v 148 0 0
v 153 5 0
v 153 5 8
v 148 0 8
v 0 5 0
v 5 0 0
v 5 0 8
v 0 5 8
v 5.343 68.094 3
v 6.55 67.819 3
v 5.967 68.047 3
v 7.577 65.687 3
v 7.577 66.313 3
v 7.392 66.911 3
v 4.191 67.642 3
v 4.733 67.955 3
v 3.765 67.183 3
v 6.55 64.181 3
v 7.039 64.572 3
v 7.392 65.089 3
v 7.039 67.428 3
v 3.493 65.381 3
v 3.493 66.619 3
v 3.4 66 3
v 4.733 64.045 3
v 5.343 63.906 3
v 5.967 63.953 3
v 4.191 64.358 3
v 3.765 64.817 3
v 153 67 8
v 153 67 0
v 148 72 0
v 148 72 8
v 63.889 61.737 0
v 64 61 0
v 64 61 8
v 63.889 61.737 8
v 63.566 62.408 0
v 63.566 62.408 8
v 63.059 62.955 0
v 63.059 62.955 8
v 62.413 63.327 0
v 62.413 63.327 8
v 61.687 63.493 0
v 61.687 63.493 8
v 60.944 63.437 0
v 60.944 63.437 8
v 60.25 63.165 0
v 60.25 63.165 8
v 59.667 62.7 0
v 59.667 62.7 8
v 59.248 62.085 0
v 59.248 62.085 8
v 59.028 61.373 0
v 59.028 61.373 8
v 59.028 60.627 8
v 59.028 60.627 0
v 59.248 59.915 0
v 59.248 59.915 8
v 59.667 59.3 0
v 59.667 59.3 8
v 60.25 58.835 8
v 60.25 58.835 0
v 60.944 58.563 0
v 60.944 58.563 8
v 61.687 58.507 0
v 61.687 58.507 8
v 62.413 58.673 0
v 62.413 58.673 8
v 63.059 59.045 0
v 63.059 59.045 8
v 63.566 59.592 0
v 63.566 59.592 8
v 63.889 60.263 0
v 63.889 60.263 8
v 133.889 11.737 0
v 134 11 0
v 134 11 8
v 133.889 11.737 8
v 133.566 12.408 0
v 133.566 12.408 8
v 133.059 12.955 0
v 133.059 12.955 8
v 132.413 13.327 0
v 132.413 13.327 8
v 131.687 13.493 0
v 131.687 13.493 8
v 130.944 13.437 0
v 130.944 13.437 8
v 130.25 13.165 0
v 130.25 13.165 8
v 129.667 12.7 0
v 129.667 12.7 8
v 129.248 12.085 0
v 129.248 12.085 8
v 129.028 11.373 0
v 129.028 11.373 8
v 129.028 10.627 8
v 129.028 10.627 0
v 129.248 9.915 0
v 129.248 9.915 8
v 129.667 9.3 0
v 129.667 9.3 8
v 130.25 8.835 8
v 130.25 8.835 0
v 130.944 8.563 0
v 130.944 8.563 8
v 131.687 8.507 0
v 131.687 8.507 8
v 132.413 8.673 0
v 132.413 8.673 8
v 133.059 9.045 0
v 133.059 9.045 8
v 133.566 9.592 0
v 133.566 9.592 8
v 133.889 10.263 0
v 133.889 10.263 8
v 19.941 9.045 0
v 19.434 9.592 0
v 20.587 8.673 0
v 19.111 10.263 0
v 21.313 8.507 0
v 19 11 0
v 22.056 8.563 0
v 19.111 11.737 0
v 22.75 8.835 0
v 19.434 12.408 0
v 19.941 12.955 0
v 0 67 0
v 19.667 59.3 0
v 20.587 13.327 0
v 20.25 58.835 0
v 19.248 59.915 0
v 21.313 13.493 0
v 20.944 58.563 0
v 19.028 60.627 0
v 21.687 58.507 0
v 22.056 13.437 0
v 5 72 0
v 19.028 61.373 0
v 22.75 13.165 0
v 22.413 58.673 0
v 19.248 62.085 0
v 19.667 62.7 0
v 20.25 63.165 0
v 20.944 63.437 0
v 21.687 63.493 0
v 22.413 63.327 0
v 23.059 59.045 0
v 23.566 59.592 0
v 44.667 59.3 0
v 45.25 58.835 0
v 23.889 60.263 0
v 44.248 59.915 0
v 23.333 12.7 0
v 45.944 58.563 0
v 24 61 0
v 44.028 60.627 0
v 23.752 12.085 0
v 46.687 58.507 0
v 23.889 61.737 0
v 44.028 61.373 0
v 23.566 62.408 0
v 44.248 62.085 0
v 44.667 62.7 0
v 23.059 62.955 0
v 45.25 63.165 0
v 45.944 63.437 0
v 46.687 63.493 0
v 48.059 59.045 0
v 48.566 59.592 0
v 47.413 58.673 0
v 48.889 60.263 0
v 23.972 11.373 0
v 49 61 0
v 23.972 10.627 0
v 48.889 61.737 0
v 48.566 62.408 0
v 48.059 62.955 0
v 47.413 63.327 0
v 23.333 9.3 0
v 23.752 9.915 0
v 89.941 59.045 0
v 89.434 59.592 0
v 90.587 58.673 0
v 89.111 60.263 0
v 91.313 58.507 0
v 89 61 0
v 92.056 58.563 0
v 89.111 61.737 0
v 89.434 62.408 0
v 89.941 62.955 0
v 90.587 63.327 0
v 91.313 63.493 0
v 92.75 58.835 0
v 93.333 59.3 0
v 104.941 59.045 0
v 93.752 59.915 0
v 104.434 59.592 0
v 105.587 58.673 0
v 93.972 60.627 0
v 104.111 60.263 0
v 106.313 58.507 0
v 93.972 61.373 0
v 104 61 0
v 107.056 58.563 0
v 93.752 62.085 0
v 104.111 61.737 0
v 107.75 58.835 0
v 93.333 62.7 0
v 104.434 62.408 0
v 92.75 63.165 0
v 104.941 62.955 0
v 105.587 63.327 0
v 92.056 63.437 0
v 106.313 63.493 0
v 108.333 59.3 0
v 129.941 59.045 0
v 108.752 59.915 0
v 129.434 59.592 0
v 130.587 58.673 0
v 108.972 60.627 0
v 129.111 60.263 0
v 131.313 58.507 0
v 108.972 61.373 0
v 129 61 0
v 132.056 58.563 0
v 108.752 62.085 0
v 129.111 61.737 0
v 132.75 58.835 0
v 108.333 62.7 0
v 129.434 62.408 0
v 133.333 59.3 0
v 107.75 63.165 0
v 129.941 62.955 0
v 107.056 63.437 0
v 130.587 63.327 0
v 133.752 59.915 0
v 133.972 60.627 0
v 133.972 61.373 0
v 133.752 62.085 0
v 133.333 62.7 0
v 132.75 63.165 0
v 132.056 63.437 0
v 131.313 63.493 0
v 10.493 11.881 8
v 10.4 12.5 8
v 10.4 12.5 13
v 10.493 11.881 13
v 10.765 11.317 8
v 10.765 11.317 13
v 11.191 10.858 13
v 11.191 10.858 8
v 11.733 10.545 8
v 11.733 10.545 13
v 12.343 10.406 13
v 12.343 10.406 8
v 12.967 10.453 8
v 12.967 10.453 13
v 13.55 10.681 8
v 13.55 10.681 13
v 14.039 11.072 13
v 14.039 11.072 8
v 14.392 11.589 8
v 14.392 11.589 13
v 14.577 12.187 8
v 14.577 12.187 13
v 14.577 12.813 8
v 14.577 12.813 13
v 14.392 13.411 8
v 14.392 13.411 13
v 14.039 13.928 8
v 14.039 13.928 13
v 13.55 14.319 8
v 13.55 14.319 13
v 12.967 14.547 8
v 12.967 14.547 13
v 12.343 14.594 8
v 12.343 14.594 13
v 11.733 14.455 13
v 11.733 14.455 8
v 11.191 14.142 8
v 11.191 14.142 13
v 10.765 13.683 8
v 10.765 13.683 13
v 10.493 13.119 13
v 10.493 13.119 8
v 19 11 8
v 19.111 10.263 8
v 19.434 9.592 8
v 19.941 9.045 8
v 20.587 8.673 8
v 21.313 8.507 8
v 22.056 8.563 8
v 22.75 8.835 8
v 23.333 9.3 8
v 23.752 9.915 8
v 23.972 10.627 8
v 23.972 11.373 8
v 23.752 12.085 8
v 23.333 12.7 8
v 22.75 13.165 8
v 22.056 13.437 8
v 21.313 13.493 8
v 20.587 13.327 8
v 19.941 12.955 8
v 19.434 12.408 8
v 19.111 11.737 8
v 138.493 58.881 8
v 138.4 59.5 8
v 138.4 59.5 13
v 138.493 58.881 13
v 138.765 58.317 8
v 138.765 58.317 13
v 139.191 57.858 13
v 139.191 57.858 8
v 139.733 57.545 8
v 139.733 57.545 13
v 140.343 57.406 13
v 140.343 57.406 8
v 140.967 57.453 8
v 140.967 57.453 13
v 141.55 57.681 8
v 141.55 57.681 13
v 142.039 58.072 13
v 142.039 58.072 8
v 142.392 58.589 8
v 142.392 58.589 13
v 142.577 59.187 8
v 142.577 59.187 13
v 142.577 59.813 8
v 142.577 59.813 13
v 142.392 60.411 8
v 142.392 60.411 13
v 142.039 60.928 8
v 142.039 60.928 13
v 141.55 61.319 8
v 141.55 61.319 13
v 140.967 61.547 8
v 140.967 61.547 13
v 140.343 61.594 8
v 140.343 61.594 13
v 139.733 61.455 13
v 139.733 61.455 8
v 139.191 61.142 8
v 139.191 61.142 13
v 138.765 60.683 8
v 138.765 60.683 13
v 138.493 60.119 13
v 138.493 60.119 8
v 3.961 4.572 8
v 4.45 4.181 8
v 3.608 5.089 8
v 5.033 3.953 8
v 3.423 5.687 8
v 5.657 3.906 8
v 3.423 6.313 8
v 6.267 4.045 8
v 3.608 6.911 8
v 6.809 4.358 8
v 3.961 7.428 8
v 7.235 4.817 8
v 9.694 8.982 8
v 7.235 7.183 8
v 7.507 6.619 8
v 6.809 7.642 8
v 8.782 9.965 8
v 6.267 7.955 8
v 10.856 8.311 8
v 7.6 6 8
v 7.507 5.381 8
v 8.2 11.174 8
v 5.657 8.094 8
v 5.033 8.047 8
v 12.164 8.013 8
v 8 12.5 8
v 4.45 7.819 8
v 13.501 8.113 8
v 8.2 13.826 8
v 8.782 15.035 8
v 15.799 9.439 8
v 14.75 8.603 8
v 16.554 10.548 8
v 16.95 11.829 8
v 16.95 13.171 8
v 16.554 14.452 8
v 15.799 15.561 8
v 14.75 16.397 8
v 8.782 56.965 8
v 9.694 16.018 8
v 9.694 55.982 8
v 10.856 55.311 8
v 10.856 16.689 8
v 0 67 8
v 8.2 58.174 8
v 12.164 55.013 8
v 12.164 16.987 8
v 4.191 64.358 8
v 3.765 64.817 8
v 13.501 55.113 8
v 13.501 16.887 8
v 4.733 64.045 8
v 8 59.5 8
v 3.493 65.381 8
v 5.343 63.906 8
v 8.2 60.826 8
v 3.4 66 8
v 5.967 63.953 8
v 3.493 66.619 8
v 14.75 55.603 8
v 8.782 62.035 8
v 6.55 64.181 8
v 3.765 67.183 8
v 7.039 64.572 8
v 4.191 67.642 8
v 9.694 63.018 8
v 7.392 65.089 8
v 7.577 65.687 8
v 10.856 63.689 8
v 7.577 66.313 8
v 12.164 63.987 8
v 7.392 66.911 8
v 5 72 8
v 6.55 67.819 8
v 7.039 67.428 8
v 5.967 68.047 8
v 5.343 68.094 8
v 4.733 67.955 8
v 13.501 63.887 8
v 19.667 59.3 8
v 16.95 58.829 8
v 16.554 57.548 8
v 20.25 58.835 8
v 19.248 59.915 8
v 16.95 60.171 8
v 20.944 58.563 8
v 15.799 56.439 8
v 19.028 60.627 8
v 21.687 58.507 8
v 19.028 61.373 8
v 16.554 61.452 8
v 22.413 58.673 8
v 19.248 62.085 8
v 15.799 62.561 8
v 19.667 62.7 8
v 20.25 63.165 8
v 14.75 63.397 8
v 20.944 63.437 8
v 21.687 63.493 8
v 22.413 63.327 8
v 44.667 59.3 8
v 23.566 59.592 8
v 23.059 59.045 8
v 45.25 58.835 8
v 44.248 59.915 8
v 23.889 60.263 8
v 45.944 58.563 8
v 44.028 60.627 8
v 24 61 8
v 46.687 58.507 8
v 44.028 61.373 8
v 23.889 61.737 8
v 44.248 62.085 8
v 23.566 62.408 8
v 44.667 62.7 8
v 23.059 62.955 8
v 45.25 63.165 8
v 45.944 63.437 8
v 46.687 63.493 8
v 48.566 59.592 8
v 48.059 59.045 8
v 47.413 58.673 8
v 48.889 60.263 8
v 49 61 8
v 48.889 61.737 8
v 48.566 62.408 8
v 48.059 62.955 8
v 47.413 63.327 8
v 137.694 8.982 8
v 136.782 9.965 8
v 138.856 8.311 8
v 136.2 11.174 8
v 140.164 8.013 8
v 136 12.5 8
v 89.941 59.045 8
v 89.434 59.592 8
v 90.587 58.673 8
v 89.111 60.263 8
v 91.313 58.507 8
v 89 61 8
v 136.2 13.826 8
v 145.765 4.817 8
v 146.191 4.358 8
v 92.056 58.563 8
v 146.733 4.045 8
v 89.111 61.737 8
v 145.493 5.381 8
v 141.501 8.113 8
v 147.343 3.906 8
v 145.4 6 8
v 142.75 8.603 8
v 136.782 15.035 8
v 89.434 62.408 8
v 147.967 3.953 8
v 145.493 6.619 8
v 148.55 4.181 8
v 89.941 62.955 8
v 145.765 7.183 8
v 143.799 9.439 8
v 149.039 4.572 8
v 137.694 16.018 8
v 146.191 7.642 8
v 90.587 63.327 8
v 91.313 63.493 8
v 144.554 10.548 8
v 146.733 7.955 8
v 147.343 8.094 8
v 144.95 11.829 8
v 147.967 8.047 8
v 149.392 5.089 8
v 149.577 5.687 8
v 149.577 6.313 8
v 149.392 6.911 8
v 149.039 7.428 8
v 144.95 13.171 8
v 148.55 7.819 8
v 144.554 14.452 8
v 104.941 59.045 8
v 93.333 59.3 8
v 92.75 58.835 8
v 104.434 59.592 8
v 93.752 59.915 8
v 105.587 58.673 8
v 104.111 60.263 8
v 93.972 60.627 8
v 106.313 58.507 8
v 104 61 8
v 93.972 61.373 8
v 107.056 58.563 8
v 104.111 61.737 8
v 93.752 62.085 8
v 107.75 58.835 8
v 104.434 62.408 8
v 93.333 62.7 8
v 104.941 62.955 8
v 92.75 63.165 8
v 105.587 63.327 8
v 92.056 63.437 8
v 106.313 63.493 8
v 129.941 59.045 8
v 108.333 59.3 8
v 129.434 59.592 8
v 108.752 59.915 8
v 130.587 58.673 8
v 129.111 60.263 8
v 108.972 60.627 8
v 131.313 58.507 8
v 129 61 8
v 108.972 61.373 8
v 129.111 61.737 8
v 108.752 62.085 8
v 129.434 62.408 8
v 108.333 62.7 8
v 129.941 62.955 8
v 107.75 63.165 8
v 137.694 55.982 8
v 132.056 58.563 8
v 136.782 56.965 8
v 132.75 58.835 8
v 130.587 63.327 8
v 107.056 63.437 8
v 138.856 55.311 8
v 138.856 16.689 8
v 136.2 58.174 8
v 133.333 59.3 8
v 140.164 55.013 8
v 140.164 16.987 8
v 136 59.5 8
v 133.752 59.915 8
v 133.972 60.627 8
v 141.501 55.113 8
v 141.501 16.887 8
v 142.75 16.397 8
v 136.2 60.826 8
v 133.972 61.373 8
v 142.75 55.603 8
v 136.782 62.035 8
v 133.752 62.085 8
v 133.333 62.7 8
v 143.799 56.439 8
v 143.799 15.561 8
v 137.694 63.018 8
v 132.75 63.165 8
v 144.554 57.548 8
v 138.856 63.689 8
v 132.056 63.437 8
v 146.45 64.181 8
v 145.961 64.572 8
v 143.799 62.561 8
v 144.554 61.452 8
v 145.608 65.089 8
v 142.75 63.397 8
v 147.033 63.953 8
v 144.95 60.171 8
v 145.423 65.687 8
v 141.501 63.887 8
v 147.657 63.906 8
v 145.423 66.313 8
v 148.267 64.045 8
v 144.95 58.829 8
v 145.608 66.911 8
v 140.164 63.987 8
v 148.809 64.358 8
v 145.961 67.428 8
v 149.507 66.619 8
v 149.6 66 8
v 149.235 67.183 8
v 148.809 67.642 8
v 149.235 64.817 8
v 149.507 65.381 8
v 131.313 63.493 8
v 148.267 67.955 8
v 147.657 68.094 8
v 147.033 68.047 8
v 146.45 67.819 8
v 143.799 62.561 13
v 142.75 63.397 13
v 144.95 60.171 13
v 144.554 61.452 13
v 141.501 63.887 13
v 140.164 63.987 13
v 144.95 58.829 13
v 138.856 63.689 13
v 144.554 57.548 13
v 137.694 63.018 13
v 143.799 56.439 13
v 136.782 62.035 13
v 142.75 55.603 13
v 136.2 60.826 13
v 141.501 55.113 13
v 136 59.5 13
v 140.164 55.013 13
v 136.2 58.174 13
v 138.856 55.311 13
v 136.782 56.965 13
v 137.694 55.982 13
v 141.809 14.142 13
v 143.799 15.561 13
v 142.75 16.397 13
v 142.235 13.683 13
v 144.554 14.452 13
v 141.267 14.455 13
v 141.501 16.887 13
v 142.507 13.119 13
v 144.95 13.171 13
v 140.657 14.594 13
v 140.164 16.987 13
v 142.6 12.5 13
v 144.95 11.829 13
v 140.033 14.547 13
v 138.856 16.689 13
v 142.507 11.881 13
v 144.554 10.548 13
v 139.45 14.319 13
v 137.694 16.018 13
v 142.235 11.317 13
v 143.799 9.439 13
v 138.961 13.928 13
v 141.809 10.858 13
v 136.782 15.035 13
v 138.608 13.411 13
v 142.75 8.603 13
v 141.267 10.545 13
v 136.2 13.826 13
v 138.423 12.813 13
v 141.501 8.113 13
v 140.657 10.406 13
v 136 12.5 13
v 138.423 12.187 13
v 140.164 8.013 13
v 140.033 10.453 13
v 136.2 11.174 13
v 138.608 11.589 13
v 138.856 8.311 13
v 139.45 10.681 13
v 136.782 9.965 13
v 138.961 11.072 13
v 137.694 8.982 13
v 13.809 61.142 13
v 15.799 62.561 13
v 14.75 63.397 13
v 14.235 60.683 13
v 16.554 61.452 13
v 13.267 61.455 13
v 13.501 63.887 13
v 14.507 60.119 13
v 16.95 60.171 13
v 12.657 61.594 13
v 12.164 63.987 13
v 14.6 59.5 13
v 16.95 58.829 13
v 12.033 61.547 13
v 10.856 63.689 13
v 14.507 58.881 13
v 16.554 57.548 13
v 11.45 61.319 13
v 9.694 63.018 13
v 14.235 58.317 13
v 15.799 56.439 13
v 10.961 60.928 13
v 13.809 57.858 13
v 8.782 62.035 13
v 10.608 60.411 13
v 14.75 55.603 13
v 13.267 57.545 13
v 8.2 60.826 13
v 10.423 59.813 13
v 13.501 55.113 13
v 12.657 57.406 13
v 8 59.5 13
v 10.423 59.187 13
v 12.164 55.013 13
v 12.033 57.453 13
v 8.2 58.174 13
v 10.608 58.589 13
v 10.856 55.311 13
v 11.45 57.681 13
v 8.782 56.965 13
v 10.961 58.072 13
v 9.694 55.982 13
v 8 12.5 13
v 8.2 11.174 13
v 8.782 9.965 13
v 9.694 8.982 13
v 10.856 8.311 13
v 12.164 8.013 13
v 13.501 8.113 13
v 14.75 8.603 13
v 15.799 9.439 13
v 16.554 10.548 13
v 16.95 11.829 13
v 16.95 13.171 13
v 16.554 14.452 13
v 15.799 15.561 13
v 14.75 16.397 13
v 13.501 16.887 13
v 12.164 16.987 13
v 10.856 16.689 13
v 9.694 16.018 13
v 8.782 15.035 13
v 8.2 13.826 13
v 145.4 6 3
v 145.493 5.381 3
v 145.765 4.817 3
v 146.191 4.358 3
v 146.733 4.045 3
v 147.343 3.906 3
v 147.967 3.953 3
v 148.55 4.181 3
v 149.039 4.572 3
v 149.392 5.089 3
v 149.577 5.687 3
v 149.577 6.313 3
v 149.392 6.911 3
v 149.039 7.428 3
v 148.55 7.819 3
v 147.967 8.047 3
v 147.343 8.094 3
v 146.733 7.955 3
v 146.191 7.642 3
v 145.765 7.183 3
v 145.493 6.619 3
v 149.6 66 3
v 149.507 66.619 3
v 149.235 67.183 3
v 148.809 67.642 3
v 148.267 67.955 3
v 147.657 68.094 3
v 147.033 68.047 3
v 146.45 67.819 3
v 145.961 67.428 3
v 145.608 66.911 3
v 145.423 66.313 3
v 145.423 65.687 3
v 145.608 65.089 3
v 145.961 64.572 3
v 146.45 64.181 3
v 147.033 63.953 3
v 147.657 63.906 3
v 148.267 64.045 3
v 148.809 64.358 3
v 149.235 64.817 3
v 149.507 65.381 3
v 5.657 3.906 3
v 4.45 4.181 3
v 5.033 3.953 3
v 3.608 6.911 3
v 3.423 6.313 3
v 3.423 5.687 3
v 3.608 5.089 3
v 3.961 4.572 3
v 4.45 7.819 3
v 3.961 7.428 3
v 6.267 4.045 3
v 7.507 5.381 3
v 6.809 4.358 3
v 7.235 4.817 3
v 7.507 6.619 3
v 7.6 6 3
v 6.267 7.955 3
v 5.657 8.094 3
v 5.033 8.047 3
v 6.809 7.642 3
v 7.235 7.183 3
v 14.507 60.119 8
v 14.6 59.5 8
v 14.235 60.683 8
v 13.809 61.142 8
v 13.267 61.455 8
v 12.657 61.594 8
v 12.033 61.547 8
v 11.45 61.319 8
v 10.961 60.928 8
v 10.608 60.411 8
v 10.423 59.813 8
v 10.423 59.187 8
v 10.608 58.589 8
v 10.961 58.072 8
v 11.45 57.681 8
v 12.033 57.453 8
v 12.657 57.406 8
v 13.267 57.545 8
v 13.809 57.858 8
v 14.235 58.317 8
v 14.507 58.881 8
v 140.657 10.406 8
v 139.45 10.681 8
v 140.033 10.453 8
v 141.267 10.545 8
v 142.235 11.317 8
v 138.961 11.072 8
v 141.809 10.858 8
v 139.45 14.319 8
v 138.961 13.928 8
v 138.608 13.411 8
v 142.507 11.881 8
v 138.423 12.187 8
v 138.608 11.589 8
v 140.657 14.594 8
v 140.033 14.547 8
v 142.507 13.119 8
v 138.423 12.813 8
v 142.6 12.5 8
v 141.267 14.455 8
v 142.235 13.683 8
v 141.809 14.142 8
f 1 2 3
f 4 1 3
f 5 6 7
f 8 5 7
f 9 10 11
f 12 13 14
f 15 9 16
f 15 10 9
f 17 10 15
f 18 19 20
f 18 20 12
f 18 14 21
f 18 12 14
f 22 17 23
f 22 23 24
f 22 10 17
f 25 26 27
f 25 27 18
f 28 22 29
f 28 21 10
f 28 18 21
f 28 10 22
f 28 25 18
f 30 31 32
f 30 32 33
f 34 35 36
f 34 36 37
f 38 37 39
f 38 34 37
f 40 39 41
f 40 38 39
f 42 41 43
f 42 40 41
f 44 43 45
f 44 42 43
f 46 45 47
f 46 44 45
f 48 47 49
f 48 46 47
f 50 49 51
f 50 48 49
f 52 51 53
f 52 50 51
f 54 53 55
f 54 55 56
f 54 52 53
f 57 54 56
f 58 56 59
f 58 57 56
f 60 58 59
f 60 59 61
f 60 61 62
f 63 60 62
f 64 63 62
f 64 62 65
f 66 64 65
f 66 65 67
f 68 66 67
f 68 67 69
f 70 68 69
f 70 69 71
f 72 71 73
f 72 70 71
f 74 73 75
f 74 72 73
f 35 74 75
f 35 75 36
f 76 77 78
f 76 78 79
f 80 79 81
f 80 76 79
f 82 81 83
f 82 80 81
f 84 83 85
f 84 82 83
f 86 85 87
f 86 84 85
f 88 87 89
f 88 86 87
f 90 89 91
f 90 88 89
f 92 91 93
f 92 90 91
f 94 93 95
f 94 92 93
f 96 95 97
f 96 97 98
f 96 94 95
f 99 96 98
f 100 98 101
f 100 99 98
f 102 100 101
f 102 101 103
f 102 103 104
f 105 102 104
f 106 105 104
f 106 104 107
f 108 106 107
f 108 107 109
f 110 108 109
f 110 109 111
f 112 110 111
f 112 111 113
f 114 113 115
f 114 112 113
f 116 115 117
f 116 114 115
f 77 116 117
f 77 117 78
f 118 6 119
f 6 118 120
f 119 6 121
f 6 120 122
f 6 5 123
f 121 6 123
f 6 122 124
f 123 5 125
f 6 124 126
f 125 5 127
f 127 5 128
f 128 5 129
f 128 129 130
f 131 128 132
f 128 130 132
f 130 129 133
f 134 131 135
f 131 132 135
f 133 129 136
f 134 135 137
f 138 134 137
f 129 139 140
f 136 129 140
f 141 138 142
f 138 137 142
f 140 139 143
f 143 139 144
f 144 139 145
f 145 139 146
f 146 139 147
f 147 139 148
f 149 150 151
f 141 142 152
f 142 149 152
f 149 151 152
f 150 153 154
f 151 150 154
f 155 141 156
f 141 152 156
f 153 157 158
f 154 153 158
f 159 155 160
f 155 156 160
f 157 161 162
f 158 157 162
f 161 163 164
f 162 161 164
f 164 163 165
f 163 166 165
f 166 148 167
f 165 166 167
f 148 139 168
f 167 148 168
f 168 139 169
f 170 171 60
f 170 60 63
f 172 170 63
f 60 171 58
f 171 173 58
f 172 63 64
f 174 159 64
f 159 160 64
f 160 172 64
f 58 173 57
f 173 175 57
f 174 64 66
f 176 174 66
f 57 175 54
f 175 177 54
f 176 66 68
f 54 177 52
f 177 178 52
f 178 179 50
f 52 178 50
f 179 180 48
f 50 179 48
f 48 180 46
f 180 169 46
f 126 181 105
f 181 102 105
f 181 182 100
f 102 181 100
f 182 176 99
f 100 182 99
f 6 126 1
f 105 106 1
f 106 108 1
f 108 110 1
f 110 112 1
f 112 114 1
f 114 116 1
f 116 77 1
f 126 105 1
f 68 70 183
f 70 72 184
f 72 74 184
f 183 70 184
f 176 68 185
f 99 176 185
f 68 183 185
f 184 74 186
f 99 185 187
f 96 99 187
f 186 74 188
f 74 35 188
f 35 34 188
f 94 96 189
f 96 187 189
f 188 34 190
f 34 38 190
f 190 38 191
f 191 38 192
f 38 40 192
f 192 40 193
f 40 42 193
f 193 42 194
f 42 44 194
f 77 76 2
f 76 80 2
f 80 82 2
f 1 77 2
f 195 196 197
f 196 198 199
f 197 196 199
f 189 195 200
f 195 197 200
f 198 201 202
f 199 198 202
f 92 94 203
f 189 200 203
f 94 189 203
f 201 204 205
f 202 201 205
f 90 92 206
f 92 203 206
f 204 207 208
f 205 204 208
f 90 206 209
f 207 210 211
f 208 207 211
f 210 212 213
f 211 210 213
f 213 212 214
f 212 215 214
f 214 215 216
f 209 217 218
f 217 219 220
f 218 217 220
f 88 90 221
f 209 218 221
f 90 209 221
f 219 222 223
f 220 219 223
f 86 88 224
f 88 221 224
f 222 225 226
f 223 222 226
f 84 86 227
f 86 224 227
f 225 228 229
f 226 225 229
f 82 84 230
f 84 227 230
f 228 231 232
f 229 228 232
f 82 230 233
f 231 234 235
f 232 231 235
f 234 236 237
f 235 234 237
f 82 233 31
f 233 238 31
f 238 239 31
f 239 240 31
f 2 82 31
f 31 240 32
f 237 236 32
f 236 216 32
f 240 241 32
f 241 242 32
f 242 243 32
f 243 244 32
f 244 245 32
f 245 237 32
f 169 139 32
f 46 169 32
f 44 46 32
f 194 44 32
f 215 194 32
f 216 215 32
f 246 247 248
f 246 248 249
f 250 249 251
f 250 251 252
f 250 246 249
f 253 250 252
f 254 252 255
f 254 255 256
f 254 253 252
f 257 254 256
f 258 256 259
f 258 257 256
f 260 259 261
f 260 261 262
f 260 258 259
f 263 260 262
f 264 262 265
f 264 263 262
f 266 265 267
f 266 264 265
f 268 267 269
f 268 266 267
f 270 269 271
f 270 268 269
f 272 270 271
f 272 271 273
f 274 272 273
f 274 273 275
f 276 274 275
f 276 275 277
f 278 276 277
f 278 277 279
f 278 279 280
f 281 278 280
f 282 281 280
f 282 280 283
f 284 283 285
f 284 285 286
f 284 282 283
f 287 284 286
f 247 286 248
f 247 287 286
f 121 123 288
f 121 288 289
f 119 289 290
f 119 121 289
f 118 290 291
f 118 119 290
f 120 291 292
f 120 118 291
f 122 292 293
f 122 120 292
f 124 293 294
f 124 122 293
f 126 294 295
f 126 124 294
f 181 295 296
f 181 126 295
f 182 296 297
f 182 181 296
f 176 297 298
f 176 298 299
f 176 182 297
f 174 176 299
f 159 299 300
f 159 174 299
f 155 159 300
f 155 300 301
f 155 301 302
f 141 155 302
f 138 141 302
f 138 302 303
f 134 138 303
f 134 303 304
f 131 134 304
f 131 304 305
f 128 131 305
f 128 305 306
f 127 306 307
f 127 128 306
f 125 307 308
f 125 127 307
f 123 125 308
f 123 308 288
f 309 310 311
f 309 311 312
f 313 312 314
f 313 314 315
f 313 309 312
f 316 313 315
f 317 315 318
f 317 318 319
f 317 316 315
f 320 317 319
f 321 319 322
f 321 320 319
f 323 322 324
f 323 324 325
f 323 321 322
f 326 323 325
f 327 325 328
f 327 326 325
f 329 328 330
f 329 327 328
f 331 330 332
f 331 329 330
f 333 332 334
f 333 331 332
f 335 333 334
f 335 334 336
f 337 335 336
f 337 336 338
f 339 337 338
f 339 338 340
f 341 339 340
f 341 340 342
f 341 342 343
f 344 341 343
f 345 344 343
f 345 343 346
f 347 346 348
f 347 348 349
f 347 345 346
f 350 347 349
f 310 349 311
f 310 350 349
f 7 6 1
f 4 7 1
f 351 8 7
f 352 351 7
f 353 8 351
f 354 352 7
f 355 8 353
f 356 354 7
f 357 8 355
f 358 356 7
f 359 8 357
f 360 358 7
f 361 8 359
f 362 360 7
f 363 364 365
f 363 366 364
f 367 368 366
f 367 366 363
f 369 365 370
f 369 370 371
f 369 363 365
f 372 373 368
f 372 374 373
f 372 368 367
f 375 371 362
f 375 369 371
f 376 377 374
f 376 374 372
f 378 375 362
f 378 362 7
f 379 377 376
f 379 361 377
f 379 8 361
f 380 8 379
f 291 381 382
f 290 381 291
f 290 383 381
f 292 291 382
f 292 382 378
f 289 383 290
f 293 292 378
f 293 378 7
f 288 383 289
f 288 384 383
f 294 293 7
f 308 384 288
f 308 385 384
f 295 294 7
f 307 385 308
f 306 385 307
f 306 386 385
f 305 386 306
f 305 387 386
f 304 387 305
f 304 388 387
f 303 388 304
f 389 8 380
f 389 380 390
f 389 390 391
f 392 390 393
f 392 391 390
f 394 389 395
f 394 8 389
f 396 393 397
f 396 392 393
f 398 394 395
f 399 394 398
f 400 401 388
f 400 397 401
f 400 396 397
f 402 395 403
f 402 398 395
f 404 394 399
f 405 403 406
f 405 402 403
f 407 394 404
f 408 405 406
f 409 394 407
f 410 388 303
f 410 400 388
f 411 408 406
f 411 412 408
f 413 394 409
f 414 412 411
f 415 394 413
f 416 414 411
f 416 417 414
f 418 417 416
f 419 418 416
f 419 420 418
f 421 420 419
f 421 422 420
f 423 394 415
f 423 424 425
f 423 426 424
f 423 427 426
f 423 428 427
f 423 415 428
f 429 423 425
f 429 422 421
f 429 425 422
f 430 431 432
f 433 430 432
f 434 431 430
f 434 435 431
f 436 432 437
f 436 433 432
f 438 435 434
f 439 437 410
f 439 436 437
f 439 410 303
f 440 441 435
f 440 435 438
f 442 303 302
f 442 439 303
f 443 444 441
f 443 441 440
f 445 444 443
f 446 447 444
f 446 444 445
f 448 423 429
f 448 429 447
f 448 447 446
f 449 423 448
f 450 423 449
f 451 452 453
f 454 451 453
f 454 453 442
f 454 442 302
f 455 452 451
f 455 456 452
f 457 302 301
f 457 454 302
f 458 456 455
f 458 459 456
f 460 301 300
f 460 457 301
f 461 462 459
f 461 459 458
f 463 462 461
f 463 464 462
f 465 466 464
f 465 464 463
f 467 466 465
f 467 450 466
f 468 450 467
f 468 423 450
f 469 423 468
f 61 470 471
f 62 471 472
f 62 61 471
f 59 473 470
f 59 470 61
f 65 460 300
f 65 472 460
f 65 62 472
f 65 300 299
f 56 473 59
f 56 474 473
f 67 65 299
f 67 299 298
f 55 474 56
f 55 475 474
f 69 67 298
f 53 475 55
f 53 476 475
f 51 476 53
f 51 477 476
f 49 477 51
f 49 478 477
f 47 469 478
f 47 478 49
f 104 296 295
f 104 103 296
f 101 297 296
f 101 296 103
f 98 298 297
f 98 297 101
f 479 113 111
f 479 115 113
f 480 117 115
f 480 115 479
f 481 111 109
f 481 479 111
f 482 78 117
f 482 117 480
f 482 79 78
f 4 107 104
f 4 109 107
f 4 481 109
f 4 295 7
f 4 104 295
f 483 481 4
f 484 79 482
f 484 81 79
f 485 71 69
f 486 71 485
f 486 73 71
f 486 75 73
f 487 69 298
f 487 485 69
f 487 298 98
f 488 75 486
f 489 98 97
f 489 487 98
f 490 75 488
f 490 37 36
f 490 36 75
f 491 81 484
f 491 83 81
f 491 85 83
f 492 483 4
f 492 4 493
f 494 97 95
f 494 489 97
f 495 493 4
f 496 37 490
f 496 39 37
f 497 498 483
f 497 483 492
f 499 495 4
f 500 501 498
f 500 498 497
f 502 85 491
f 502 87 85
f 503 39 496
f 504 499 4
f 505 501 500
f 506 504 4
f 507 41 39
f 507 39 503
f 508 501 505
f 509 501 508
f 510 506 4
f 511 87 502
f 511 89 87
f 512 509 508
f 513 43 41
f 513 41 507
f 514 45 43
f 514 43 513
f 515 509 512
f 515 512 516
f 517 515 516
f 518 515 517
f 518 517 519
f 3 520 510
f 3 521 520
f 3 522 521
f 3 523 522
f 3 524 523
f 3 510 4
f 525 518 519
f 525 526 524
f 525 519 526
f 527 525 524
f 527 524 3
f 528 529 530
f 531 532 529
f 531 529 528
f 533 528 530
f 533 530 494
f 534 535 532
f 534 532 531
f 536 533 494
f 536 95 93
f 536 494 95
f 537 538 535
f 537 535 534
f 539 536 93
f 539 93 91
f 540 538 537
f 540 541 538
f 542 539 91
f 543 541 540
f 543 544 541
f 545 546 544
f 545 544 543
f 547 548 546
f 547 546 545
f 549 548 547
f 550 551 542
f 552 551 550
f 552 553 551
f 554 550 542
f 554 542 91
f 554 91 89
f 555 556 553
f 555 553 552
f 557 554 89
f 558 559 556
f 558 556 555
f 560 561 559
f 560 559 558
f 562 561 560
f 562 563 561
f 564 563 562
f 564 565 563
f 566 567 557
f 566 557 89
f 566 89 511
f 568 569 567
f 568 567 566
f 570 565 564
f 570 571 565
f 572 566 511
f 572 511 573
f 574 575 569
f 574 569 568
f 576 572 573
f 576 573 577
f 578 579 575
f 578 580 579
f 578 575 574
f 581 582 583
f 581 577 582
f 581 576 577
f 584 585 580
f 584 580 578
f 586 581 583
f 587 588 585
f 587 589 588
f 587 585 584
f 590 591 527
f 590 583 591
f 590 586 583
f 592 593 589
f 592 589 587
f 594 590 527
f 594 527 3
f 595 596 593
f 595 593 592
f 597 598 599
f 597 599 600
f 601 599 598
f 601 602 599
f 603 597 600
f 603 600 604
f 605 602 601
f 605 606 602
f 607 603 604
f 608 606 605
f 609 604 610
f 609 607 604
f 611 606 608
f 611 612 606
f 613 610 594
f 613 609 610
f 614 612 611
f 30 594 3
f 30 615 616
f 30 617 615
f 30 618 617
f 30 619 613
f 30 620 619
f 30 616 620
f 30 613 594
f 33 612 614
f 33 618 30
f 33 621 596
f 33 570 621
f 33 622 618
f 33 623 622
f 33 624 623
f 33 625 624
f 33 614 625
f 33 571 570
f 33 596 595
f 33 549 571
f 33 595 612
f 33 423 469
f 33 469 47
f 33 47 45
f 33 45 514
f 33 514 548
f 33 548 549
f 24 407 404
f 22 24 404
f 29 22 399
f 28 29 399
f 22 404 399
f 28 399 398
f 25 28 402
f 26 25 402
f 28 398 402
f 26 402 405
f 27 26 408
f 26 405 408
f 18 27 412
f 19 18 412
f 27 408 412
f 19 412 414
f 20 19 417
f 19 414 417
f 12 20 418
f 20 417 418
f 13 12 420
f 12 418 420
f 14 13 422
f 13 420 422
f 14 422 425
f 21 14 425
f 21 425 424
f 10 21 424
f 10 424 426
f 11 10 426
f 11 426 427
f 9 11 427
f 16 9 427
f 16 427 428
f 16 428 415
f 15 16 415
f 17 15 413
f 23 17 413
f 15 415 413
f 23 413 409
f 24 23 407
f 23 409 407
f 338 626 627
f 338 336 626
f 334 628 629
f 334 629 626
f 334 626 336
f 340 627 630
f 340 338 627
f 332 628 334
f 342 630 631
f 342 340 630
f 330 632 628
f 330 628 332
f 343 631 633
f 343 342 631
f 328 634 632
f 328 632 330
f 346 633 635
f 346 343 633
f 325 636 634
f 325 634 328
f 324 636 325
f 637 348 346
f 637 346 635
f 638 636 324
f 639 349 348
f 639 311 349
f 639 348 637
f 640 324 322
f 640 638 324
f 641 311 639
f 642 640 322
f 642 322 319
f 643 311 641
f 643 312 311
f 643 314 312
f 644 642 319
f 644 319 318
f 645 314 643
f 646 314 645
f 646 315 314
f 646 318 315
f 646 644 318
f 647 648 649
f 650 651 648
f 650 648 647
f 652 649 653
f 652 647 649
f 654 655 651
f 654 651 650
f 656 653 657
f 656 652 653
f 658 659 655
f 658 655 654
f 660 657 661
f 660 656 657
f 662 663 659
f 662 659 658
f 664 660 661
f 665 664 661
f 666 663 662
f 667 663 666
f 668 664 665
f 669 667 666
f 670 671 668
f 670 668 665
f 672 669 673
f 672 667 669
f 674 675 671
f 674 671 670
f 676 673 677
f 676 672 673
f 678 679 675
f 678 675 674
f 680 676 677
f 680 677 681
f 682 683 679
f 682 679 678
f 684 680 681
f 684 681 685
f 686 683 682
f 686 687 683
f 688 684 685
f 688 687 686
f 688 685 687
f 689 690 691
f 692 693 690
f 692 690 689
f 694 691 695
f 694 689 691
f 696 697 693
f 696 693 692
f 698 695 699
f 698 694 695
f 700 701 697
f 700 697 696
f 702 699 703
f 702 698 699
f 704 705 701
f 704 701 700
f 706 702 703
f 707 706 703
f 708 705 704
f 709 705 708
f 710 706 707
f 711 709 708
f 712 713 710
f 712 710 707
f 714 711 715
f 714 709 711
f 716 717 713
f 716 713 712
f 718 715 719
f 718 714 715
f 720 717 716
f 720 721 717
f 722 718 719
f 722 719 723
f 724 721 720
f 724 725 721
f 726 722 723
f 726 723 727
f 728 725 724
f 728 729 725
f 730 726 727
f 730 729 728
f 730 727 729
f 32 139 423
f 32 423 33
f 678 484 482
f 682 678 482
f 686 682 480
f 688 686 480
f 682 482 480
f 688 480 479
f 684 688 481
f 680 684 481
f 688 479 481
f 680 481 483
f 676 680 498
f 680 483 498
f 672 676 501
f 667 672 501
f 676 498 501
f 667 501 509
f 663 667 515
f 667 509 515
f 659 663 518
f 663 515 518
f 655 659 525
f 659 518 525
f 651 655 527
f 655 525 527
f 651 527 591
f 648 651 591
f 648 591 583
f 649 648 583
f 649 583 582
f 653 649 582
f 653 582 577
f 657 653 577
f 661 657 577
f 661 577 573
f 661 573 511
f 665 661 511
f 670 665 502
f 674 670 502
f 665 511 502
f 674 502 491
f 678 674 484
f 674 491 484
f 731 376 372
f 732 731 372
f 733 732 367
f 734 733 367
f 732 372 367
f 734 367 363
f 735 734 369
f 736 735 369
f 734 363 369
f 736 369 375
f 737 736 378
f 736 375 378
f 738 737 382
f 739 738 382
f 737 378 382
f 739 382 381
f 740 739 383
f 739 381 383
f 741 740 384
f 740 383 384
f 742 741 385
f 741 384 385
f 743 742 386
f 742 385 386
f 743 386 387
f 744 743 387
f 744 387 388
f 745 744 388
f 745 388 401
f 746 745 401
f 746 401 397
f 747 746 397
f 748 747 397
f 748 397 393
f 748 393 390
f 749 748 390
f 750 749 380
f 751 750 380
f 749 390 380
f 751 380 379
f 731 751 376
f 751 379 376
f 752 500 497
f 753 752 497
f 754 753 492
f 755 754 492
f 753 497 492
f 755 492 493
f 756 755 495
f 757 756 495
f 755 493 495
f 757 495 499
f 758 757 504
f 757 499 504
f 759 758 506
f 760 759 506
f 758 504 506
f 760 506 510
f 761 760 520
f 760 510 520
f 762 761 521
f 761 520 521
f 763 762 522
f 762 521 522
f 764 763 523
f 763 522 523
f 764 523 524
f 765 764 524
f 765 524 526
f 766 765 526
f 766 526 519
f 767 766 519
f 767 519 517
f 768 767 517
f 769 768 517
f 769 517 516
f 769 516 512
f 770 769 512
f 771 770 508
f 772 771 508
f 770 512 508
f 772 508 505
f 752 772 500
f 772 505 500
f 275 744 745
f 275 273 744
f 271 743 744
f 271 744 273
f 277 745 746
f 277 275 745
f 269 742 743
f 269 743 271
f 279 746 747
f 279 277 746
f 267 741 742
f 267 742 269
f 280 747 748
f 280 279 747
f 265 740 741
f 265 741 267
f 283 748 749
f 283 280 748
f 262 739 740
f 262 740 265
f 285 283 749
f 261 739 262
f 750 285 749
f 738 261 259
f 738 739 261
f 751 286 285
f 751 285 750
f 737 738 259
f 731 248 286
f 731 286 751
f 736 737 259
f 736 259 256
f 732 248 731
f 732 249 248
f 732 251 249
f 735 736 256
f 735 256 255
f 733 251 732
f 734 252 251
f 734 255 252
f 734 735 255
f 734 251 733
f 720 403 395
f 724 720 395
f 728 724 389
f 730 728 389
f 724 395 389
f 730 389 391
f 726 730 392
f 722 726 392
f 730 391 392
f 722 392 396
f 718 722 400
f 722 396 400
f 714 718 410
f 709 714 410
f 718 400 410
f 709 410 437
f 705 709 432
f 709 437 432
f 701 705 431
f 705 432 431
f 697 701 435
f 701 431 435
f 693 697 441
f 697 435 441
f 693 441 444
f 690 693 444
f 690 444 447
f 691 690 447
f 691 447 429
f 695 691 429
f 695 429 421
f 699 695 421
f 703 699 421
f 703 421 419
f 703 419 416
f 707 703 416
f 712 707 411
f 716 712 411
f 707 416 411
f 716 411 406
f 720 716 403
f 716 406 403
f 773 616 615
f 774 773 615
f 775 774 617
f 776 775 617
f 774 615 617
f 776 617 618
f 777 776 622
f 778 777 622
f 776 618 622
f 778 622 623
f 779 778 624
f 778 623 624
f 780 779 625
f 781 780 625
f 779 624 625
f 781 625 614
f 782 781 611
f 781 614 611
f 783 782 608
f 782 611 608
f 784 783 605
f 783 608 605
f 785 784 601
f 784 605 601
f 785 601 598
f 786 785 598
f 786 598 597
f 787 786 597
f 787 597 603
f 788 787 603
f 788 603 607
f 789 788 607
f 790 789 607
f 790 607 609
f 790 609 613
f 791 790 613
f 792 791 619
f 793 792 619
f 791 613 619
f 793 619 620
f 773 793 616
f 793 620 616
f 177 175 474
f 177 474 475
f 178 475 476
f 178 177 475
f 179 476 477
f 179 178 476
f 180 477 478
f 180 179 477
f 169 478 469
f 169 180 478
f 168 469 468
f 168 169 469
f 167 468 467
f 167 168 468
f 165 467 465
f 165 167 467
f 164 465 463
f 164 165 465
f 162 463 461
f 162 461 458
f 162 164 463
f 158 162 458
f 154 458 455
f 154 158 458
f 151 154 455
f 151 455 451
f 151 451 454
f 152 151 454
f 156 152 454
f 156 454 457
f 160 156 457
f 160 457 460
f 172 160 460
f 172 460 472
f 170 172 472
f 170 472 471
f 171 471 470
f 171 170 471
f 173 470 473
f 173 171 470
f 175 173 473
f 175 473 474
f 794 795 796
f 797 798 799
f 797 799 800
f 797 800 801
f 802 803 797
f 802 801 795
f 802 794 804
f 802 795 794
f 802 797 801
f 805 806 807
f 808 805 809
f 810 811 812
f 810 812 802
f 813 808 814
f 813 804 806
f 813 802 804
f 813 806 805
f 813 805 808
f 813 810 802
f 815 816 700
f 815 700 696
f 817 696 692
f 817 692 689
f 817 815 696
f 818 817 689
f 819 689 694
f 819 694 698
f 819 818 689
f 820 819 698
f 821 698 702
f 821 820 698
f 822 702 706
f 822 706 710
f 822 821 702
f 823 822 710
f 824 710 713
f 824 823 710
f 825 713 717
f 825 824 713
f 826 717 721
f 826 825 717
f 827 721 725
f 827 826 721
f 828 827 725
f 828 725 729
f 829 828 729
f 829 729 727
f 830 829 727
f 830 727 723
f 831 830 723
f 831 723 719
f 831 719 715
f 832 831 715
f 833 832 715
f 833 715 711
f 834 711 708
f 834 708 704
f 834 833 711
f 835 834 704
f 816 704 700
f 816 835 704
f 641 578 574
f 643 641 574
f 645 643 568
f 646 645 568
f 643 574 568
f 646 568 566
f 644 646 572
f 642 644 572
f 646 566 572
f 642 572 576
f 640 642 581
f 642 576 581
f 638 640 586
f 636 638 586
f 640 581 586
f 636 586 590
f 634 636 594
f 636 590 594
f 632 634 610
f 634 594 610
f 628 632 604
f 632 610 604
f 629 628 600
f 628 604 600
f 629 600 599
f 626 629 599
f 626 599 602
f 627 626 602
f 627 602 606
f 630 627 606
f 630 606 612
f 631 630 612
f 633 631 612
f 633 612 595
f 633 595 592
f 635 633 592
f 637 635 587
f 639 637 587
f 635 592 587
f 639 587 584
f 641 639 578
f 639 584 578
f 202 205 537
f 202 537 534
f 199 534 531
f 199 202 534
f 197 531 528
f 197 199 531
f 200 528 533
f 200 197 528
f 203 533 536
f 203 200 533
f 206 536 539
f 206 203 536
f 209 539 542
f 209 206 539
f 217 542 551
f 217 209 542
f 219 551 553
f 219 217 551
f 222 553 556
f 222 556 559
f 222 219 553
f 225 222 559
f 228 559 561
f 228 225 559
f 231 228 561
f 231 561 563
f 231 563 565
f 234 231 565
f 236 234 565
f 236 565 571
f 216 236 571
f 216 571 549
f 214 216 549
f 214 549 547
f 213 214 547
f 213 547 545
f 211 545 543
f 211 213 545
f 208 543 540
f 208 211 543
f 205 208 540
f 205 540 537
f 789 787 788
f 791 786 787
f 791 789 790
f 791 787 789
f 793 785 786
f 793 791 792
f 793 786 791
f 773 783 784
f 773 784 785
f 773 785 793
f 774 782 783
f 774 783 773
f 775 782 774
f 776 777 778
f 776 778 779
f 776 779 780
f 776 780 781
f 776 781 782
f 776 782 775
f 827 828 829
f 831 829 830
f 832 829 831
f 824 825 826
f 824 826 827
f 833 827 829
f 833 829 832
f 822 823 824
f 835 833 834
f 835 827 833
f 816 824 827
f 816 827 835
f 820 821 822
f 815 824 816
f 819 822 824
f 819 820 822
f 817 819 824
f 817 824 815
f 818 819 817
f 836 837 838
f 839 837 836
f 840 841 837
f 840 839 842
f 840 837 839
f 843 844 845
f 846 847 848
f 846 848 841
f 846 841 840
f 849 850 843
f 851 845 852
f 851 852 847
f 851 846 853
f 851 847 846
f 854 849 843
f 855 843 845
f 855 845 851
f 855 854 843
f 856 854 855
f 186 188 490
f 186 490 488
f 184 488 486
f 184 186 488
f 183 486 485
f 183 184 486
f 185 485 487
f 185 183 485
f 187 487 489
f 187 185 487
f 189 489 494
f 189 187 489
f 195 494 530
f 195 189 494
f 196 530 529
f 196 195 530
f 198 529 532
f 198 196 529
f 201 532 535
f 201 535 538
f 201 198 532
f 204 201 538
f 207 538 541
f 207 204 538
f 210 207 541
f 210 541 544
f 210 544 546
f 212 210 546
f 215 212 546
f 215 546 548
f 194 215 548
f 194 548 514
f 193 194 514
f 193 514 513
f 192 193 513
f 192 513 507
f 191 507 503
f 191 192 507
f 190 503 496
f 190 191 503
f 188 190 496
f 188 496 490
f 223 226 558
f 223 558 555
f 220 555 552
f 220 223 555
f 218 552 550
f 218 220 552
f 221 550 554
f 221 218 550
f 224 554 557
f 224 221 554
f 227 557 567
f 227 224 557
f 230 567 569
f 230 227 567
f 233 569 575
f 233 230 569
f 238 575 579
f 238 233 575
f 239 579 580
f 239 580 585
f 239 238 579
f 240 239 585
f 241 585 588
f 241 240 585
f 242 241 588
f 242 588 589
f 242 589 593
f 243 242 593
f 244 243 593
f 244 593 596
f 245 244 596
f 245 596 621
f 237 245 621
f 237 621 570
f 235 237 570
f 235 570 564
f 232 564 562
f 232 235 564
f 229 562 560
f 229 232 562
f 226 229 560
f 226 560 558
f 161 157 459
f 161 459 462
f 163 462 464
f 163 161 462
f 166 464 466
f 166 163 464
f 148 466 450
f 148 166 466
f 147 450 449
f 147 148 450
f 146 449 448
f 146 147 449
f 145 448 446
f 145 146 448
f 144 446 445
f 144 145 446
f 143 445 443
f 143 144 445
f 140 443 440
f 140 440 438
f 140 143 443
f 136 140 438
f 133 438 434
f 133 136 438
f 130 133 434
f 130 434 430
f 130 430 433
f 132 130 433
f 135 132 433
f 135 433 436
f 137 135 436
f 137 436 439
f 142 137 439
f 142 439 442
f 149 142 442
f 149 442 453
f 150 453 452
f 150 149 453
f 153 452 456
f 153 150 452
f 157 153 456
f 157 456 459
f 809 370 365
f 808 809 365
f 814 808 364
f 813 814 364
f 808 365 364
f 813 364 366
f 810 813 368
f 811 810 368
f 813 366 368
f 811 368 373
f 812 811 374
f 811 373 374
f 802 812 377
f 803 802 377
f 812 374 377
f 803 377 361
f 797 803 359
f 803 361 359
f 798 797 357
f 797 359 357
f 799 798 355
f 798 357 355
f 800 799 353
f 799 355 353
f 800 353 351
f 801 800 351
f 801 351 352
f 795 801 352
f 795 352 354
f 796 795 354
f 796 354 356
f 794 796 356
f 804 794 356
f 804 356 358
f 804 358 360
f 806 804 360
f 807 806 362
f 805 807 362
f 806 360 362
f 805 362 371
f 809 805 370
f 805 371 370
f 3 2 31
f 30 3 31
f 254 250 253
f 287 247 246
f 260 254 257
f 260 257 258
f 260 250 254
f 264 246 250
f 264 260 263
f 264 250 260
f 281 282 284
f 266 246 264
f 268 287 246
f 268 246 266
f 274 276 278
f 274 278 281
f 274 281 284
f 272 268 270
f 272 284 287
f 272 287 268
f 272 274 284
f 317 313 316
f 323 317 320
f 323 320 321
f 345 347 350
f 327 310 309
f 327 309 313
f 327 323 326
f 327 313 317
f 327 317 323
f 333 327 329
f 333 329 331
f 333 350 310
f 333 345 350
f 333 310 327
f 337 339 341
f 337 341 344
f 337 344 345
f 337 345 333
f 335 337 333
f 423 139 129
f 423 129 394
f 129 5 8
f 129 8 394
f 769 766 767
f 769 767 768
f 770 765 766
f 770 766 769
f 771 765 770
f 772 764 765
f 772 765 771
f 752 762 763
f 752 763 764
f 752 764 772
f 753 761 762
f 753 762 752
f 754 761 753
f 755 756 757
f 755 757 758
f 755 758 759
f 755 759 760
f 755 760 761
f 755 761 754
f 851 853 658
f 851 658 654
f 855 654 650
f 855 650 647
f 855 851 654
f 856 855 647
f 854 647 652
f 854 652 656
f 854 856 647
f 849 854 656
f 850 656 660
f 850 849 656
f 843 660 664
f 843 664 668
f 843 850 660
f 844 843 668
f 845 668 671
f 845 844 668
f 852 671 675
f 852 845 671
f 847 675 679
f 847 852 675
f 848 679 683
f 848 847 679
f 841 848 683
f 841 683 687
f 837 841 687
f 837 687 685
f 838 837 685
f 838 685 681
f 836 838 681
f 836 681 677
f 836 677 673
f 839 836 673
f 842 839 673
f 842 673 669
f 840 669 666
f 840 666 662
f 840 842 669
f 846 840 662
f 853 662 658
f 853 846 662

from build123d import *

# Parameters (mm, degrees)
SKETCH1_W           = 153
SKETCH1_H           = 72
SKETCH1_R           = 2.5
BOSS_EXTRUDE1_DEPTH = 8
SKETCH2_R           = 4.5
SKETCH2_R_2         = 2.1
BOSS_EXTRUDE2_DEPTH = 5
CHAMFER1_SIZE       = 5
SKETCH3_R           = 2.1
CUT_EXTRUDE1_DEPTH  = 5


with BuildPart() as part:
    # Sketch1 → Boss-Extrude1 (new body)
    with BuildSketch(Plane.XY):
        with Locations((76.5, 36)):
            Rectangle(SKETCH1_W, SKETCH1_H)
        with Locations((21.5, 61)):
            Circle(SKETCH1_R, mode=Mode.SUBTRACT)
        with Locations(Location((21.5, 11, 0), (0, 0, 180))):
            Circle(SKETCH1_R, mode=Mode.SUBTRACT)
        with Locations(Location((131.5, 61, 0), (0, 0, 180))):
            Circle(SKETCH1_R, mode=Mode.SUBTRACT)
        with Locations((131.5, 11)):
            Circle(SKETCH1_R, mode=Mode.SUBTRACT)
        with Locations((61.5, 61)):
            Circle(SKETCH1_R, mode=Mode.SUBTRACT)
        with Locations((46.5, 61)):
            Circle(SKETCH1_R, mode=Mode.SUBTRACT)
        with Locations(Location((106.5, 61, 0), (0, 0, 180))):
            Circle(SKETCH1_R, mode=Mode.SUBTRACT)
        with Locations(Location((91.5, 61, 0), (0, 0, 180))):
            Circle(SKETCH1_R, mode=Mode.SUBTRACT)
    extrude(amount=BOSS_EXTRUDE1_DEPTH)

    # Sketch2 → Boss-Extrude2 (add)
    # profile 1 of 4: a face of its own
    with BuildSketch(Plane.XY.offset(8)):
        with Locations(Location((12.5, 59.5, 0), (0, 0, 180))):
            Circle(SKETCH2_R)
        with Locations((12.5, 59.5)):
            Circle(SKETCH2_R_2, mode=Mode.SUBTRACT)
    # profile 2 of 4: a face of its own
    with BuildSketch(Plane.XY.offset(8)):
        with Locations(Location((12.5, 12.5, 0), (0, 0, 180))):
            Circle(SKETCH2_R)
        with Locations(Location((12.5, 12.5, 0), (0, 0, 180))):
            Circle(SKETCH2_R_2, mode=Mode.SUBTRACT)
    # profile 3 of 4: a face of its own
    with BuildSketch(Plane.XY.offset(8)):
        with Locations(Location((140.5, 59.5, 0), (0, 0, 180))):
            Circle(SKETCH2_R)
        with Locations(Location((140.5, 59.5, 0), (0, 0, 180))):
            Circle(SKETCH2_R_2, mode=Mode.SUBTRACT)
    # profile 4 of 4: a face of its own
    with BuildSketch(Plane.XY.offset(8)):
        with Locations(Location((140.5, 12.5, 0), (0, 0, 180))):
            Circle(SKETCH2_R)
        with Locations((140.5, 12.5)):
            Circle(SKETCH2_R_2, mode=Mode.SUBTRACT)
    extrude(amount=BOSS_EXTRUDE2_DEPTH)

    # Chamfer1
    chamfer1_edges = [part.edges().sort_by_distance(p)[0] for p in [
        (0, 72, 4),
        (153, 72, 4),
        (153, 0, 4),
        (0, 0, 4),
    ]]
    chamfer(chamfer1_edges, length=CHAMFER1_SIZE)

    # Sketch3 → Cut-Extrude1 (cut)
    with BuildSketch(Plane.XY.offset(8)):
        with Locations((5.5, 6)):
            Circle(SKETCH3_R)
        with Locations(Location((5.5, 66, 0), (0, 0, 180))):
            Circle(SKETCH3_R)
        with Locations(Location((147.5, 6, 0), (0, 0, 180))):
            Circle(SKETCH3_R)
        with Locations((147.5, 66)):
            Circle(SKETCH3_R)
    extrude(amount=-CUT_EXTRUDE1_DEPTH, mode=Mode.SUBTRACT)


solid = part.part
